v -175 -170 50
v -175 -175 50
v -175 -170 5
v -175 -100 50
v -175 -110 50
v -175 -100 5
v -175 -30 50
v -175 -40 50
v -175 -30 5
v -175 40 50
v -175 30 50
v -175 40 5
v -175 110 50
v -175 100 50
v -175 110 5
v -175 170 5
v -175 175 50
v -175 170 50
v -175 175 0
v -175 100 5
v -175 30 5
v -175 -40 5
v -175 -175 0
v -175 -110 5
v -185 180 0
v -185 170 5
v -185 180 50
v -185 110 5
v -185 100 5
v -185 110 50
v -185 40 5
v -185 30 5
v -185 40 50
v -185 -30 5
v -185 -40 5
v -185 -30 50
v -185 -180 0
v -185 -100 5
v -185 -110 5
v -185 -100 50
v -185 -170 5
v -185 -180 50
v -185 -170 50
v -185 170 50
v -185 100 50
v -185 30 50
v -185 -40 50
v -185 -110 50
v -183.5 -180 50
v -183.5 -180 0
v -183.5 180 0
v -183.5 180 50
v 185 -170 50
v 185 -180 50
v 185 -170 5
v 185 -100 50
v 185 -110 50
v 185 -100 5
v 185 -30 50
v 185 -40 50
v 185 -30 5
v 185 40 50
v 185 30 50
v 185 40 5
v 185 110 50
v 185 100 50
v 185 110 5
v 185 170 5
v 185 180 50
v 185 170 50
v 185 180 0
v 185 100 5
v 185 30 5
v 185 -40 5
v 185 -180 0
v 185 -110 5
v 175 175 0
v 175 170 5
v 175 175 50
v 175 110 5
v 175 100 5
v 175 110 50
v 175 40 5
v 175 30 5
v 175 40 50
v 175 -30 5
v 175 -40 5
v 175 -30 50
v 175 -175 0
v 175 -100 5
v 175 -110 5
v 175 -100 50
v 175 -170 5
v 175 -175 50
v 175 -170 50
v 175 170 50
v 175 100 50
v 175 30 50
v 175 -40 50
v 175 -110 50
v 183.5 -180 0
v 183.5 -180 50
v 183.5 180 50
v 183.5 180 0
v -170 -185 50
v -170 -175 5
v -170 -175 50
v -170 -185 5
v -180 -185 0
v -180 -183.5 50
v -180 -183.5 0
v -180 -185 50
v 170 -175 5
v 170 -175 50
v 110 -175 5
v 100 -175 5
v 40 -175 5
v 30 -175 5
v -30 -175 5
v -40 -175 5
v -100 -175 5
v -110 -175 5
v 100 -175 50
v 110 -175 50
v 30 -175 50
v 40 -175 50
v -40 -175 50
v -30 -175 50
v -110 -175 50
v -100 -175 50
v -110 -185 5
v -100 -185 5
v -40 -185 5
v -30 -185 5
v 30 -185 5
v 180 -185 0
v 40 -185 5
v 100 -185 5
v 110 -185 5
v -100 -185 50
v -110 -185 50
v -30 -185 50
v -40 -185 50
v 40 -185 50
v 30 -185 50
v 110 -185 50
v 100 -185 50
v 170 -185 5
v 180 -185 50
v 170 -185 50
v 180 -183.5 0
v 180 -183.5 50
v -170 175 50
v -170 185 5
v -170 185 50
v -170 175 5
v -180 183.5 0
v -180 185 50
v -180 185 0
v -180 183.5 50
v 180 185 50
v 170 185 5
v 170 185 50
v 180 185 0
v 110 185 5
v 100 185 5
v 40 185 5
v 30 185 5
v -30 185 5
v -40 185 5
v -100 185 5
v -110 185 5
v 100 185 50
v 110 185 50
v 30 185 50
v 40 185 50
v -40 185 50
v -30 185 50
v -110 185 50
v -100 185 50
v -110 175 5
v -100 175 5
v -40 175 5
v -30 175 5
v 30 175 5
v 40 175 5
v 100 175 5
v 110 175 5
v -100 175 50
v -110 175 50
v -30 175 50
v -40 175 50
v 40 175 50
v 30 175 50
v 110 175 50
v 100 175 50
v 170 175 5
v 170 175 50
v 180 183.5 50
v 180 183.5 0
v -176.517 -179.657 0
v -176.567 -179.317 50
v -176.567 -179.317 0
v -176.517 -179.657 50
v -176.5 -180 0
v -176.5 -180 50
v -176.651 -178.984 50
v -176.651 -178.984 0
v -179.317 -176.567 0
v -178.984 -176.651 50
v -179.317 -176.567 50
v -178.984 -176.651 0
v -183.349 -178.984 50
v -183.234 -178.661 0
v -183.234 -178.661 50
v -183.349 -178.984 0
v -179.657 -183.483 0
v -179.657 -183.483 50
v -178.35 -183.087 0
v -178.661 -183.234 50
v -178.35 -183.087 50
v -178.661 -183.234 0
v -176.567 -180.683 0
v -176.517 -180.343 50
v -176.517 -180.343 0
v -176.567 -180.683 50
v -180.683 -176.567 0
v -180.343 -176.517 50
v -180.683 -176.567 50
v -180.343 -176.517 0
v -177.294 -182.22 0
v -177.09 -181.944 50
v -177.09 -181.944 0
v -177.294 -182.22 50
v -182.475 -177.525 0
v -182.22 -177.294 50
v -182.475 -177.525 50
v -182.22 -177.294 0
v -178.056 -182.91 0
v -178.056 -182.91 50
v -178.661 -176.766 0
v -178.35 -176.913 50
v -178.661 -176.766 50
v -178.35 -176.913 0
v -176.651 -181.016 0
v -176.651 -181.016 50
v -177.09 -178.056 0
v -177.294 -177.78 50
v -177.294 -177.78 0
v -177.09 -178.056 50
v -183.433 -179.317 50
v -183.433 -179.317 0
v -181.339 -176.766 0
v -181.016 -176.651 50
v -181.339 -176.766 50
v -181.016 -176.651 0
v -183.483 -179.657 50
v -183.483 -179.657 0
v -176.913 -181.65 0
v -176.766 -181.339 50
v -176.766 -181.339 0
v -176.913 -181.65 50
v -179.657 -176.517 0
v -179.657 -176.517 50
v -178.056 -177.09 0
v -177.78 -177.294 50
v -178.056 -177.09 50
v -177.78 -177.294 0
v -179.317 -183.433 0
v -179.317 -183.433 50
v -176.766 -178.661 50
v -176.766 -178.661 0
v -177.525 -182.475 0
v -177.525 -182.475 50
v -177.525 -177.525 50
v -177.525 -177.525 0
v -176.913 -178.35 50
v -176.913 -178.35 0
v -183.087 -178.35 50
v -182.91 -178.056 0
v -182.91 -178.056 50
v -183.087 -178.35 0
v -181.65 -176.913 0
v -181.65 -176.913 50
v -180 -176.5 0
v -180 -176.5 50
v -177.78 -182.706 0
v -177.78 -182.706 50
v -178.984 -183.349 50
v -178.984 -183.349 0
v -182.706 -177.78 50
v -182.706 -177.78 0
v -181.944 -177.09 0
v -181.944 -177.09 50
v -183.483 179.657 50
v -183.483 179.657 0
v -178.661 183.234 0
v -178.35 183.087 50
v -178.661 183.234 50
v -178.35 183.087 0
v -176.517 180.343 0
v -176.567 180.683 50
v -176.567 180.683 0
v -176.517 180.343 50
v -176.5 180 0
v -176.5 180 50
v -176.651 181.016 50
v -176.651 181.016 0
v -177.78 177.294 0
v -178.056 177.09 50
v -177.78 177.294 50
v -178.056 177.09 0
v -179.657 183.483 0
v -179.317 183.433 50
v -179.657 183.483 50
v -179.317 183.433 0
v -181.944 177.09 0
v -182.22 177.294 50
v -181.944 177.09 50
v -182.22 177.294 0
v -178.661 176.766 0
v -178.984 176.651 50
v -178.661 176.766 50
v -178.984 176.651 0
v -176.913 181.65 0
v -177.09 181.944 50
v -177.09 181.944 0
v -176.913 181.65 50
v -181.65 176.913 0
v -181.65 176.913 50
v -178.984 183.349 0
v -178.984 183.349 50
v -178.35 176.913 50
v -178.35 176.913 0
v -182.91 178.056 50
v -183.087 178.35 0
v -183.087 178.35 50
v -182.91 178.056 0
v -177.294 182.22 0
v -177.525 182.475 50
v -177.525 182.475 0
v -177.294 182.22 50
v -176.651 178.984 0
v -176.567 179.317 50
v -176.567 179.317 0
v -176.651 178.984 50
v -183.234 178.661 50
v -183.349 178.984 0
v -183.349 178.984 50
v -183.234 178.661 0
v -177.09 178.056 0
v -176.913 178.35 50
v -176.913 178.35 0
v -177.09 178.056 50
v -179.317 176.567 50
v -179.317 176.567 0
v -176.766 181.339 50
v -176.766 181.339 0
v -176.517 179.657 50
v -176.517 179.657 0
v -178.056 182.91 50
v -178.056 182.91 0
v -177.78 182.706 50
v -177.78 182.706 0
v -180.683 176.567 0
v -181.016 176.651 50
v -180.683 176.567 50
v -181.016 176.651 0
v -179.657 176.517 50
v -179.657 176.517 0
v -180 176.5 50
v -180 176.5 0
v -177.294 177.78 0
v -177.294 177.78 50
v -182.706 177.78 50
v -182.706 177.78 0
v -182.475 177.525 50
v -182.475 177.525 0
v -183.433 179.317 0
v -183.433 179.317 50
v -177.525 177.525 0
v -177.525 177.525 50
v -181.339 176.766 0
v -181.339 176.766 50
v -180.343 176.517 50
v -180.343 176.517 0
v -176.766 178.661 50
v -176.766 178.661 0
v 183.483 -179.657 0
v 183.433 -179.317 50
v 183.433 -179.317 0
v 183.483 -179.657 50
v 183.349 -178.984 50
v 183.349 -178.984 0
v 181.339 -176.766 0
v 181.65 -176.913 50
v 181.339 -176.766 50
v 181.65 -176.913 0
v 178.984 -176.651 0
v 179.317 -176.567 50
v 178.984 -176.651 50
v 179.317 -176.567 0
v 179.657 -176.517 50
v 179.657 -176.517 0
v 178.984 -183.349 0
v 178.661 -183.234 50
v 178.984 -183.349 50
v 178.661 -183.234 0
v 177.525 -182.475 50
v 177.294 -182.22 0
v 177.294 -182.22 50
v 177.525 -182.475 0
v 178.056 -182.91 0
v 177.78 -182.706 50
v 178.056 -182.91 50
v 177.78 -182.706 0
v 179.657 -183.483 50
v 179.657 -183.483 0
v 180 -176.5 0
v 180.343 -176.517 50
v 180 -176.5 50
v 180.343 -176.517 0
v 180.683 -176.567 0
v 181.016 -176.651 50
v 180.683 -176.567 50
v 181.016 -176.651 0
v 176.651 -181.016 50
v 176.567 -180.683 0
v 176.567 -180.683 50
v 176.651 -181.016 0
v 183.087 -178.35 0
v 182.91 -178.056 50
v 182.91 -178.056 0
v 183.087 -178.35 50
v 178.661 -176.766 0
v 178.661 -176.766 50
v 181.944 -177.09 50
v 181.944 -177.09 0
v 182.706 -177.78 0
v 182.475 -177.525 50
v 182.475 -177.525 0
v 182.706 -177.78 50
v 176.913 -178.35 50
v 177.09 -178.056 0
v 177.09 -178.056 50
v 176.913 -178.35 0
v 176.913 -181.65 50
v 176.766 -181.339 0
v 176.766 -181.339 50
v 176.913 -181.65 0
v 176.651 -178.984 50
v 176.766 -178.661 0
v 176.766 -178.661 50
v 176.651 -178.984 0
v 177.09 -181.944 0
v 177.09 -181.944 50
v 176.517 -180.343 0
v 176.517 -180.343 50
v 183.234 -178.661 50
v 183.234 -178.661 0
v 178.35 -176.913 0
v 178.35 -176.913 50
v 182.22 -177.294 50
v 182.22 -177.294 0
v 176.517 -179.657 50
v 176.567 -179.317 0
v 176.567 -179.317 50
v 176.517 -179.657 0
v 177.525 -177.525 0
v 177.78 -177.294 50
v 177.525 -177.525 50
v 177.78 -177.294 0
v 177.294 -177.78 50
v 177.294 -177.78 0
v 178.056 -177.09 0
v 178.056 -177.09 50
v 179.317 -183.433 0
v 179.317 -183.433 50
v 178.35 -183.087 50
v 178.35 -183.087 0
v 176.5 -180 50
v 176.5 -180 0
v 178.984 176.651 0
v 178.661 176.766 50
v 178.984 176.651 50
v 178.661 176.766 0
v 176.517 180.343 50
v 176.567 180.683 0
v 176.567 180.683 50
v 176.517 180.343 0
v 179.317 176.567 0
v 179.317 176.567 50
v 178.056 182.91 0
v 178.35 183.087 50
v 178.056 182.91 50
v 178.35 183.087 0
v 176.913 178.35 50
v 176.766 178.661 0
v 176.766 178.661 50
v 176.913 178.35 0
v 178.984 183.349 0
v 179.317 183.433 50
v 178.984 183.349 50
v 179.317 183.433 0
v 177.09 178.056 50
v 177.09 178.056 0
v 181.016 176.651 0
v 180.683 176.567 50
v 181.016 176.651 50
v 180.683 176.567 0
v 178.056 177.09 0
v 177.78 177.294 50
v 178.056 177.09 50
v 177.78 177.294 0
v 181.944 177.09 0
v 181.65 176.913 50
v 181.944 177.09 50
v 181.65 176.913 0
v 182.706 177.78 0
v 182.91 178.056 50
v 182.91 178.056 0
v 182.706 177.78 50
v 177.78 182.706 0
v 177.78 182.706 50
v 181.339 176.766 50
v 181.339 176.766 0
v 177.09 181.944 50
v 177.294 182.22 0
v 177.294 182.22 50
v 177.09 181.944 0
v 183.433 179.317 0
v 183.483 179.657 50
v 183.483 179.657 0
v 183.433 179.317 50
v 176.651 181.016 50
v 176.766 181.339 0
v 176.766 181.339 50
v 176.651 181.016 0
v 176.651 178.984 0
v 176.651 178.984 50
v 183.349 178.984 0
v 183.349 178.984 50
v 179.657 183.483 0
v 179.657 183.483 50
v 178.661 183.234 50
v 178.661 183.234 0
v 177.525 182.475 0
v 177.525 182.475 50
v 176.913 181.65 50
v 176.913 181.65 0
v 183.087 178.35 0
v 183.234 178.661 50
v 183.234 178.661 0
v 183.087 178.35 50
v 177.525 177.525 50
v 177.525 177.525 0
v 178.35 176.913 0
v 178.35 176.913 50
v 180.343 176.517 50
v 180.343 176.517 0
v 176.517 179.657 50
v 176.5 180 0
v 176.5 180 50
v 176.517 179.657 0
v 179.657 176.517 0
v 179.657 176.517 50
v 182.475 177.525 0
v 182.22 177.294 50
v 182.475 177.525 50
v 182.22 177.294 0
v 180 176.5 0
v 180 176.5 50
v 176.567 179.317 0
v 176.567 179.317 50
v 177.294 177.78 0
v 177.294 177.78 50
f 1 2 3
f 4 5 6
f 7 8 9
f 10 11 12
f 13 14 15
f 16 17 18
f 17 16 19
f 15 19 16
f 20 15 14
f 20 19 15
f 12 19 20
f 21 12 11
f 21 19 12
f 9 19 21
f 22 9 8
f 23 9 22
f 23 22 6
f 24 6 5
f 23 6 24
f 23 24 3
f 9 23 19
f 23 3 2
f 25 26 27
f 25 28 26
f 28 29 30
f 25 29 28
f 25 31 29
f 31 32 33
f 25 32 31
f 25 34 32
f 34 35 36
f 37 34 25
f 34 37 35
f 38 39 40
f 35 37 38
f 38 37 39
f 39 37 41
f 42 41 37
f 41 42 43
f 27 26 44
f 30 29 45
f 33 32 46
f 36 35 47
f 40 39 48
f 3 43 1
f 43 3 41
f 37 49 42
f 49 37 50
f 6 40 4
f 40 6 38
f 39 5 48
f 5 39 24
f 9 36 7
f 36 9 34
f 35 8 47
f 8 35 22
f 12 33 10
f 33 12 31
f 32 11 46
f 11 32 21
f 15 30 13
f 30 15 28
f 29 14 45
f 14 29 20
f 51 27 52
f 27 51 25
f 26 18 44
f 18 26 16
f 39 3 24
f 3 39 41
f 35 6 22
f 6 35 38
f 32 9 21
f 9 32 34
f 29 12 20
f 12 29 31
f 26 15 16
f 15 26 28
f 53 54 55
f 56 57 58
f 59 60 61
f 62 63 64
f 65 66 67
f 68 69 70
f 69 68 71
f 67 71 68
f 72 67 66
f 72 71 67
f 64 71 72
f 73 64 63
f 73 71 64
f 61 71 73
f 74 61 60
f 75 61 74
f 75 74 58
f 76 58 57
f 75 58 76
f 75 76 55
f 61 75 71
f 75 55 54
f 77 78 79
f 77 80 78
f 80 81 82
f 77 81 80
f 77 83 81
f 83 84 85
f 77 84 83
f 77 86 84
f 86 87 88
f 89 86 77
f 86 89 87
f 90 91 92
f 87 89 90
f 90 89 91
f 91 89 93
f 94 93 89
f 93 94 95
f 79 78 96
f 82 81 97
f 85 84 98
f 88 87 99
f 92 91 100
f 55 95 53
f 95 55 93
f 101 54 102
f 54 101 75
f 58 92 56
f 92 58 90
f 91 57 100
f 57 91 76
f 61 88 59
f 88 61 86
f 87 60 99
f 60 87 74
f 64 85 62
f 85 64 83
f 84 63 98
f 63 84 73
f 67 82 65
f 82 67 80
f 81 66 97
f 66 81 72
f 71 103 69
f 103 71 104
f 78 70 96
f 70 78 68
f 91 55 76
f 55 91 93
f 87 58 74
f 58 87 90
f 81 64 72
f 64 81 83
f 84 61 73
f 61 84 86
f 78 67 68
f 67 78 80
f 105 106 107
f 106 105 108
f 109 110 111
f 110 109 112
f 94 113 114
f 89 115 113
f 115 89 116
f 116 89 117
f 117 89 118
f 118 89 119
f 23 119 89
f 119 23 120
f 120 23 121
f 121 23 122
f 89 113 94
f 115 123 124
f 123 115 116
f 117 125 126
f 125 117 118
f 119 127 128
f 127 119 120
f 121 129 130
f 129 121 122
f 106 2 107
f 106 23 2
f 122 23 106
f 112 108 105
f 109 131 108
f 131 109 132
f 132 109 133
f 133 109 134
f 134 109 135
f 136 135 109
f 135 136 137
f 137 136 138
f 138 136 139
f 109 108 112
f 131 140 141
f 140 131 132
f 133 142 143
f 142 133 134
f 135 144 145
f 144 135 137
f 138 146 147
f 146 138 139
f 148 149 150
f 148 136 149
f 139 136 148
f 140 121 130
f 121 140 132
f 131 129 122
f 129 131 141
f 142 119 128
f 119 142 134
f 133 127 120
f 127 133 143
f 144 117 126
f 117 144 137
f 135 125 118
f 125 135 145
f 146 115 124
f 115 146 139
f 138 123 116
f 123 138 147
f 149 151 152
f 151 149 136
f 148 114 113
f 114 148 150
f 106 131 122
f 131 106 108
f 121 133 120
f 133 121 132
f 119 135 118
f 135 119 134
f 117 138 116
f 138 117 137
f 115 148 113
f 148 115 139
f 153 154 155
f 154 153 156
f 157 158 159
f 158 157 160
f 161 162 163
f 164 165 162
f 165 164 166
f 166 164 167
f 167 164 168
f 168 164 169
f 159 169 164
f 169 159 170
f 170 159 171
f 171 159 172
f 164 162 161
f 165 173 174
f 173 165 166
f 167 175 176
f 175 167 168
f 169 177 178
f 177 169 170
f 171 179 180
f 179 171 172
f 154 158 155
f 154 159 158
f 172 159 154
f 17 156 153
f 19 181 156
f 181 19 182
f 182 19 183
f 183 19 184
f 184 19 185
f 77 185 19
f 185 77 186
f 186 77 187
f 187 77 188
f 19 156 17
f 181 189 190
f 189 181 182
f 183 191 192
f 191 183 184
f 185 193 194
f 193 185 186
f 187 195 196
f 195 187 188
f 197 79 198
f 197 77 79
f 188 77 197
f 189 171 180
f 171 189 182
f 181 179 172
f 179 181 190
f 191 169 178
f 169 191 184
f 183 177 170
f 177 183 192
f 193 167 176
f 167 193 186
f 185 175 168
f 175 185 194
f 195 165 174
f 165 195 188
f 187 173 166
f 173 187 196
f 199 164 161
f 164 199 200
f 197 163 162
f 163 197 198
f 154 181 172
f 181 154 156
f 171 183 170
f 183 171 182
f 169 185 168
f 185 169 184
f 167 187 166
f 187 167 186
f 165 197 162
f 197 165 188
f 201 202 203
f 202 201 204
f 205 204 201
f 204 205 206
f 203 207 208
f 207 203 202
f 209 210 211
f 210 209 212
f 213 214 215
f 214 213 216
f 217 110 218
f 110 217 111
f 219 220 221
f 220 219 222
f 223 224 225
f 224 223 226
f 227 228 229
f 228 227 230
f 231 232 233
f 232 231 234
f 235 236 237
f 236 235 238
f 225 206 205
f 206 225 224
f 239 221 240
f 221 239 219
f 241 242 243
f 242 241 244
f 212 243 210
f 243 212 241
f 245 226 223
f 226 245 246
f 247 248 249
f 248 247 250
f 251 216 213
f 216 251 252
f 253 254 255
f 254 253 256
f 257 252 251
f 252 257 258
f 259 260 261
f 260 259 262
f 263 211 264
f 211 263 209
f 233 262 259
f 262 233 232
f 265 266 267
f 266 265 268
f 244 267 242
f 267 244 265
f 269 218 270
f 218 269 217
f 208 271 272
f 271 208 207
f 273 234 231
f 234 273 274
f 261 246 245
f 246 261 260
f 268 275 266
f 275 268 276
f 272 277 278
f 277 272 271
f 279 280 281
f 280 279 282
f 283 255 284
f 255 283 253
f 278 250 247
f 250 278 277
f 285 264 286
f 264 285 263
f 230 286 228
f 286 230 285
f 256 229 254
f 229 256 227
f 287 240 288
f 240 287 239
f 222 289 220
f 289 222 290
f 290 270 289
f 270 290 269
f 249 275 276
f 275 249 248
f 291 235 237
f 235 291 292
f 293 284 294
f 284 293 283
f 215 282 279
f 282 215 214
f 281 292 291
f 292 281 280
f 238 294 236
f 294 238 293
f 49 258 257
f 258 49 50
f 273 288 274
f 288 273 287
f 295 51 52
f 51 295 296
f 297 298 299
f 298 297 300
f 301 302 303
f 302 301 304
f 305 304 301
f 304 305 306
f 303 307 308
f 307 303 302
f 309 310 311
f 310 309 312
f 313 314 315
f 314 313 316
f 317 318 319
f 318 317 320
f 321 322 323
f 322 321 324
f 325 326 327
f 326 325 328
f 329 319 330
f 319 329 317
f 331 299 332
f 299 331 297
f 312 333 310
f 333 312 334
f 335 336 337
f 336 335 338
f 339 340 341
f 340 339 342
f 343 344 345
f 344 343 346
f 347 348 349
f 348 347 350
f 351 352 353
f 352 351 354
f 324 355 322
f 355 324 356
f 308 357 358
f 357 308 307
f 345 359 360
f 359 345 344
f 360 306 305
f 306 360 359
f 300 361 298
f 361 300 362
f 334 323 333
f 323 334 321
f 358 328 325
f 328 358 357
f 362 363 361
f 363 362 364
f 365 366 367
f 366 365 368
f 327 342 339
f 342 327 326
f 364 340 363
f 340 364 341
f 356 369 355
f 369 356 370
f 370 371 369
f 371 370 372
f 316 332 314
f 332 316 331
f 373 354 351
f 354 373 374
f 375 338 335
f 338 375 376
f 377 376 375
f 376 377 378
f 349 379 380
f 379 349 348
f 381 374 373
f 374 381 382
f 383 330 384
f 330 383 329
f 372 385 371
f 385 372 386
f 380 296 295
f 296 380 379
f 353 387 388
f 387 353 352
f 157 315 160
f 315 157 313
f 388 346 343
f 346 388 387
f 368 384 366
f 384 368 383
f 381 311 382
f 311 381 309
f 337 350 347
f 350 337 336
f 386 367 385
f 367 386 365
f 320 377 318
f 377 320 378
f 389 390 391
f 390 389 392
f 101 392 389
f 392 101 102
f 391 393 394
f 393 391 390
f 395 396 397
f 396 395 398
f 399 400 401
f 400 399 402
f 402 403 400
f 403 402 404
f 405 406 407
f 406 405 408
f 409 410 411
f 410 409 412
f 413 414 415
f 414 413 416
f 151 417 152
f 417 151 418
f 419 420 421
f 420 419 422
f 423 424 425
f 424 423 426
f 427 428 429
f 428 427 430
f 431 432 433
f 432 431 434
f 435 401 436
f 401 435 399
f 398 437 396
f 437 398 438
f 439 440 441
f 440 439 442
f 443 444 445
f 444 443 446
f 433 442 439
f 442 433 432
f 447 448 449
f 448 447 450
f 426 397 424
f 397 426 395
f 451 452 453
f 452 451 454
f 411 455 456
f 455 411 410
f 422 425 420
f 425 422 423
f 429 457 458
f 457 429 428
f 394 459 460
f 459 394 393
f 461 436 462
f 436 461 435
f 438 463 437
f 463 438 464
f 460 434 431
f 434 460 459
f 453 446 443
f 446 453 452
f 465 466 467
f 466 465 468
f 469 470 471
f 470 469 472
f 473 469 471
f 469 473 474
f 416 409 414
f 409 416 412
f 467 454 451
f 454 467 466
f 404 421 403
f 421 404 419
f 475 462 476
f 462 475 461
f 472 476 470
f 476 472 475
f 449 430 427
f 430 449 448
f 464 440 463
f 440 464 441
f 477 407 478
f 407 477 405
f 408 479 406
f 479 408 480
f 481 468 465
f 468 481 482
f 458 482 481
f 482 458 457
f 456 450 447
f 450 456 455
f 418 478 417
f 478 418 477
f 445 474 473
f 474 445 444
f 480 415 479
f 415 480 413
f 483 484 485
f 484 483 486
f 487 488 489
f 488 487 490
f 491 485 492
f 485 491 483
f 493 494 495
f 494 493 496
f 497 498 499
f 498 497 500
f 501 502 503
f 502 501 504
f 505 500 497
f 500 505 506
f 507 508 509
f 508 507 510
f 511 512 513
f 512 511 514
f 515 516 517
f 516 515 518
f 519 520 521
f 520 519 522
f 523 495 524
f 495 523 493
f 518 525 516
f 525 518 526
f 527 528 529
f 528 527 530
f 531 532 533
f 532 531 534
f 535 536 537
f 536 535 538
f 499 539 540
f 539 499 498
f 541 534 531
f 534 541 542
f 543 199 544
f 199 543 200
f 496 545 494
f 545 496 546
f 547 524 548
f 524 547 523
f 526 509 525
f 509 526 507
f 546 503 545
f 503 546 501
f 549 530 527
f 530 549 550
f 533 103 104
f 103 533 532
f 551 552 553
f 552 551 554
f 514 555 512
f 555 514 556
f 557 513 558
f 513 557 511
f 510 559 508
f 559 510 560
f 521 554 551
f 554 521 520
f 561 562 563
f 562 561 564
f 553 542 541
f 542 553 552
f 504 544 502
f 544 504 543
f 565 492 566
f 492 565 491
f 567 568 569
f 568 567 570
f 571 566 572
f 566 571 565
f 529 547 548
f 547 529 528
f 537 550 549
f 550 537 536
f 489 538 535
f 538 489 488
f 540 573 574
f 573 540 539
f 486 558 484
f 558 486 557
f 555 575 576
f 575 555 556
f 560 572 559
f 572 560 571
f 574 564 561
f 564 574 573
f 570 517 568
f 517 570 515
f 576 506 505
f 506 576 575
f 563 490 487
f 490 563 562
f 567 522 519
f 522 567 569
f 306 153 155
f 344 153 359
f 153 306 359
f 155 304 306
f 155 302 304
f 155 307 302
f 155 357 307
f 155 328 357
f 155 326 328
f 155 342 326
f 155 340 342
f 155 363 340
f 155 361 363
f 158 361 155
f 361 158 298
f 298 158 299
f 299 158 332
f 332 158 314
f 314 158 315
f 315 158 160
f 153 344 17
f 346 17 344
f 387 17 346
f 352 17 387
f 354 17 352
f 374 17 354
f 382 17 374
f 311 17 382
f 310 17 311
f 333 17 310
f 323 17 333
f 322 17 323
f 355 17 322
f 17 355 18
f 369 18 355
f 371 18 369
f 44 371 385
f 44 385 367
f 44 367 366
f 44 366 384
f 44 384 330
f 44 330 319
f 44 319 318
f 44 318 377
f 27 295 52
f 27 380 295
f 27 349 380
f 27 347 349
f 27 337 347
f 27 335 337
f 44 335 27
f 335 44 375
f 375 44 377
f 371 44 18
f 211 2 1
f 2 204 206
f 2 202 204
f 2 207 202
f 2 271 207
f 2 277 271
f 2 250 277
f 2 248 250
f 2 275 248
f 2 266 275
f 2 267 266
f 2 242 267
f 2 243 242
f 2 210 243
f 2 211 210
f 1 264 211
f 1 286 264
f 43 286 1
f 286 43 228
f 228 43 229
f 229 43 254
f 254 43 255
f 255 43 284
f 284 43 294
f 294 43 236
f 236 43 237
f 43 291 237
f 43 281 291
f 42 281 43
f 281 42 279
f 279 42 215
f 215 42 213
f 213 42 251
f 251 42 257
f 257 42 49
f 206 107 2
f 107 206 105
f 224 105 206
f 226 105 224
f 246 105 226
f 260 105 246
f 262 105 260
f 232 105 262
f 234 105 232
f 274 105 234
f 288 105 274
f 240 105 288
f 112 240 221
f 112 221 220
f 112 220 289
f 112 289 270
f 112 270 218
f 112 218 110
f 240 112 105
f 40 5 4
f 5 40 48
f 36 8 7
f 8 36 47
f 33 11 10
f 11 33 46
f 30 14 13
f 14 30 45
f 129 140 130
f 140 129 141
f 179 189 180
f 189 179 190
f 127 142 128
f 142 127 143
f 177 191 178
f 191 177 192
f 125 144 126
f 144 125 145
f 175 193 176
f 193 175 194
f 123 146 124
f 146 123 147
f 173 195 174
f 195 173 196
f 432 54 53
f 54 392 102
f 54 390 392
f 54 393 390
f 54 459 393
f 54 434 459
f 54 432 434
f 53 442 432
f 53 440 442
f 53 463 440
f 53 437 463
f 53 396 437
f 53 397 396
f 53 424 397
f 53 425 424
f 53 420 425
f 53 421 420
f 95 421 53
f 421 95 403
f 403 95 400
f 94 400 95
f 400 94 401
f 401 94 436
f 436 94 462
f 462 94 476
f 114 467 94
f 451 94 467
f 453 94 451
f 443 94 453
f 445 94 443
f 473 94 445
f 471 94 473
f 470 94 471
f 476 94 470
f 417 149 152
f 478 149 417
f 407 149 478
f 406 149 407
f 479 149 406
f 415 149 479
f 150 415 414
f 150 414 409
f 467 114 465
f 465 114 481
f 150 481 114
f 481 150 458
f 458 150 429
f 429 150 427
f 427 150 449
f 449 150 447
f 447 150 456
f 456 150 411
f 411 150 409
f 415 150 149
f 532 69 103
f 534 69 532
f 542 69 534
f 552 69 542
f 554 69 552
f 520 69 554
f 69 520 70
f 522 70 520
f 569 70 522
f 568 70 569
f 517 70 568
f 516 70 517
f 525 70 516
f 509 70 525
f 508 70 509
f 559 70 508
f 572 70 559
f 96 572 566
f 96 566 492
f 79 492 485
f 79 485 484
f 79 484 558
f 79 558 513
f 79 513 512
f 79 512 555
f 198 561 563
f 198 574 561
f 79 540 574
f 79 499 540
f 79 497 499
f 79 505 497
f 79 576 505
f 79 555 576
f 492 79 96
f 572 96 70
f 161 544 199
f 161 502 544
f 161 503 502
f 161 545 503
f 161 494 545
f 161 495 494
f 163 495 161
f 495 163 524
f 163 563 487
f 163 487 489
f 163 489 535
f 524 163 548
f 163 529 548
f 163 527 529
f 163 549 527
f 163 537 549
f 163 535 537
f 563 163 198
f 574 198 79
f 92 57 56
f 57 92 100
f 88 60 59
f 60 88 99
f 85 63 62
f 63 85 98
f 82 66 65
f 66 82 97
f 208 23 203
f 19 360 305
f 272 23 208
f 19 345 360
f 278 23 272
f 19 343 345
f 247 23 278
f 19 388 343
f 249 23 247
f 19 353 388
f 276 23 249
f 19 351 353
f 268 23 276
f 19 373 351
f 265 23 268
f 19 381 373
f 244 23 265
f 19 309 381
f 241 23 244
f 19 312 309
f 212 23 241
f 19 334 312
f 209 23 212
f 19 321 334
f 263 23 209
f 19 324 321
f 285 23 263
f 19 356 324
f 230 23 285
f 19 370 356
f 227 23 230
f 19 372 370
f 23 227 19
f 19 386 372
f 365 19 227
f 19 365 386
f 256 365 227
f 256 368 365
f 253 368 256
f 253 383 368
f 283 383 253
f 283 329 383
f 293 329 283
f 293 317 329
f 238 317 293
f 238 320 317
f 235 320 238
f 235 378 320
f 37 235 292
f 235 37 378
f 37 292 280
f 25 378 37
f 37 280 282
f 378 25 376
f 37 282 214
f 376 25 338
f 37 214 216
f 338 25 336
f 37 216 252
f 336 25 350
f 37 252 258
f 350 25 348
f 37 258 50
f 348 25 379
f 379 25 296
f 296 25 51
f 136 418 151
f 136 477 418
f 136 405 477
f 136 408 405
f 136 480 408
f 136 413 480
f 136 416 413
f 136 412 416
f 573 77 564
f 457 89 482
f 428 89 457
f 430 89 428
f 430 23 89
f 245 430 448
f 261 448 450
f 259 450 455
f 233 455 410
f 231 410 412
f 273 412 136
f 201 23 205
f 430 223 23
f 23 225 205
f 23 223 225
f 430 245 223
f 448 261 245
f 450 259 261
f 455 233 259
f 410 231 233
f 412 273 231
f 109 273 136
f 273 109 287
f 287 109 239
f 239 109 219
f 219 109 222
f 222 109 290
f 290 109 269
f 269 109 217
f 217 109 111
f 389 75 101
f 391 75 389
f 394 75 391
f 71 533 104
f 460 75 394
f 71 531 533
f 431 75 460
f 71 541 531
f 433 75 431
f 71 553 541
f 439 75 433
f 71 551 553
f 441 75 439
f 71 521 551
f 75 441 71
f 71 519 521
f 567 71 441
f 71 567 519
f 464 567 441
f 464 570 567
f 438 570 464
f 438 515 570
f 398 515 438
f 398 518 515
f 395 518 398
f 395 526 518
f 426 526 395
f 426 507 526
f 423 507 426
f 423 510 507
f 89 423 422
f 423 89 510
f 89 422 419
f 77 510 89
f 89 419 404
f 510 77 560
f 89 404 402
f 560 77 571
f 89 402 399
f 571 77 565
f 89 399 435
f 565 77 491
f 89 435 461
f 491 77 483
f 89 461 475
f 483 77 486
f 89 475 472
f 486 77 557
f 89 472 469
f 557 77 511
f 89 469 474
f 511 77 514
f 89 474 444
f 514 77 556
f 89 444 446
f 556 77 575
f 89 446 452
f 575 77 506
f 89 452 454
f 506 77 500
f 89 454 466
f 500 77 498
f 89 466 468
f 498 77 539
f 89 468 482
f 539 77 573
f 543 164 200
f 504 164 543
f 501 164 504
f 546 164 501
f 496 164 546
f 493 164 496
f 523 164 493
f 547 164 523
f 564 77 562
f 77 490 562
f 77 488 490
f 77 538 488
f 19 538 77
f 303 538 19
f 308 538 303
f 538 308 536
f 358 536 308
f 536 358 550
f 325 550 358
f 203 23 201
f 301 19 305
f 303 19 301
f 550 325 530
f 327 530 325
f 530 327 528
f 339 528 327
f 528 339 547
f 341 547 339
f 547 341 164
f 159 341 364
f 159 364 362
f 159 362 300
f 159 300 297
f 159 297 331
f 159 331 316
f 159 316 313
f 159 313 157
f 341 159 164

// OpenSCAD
/*
  Cage slice 11 of 15
*/

bar = 10;
half_inner = 175;
gap = 70;
rod_d = 7;
half_outer = half_inner + bar;

function grid_pos(n) = -half_inner + n * gap;

module cage_full() {
  difference() {
    union() {
      // Floor grid at z = -10 .. 0
      for (j = [0:5]) {
        y = grid_pos(j);
        translate([-half_inner, y - bar/2, -bar])
          cube([2*half_inner, bar, bar], center=false);
      }
      for (i = [0:5]) {
        x = grid_pos(i);
        translate([x - bar/2, -half_inner, -bar])
          cube([bar, 2*half_inner, bar], center=false);
      }

      // Roof grid at z = 700 .. 710
      for (j = [0:5]) {
        y = grid_pos(j);
        translate([-half_inner, y - bar/2, 700])
          cube([2*half_inner, bar, bar], center=false);
      }
      for (i = [0:5]) {
        x = grid_pos(i);
        translate([x - bar/2, -half_inner, 700])
          cube([bar, 2*half_inner, bar], center=false);
      }

      // Side walls at x = ±175
      for (side = [-1, 1]) {
        sx = side * half_inner;
        x0 = (side == 1) ? sx : sx - bar;
        for (j = [0:5]) {
          y = grid_pos(j);
          translate([x0, y - bar/2, 0])
            cube([bar, bar, 700], center=false);
        }
        for (k = [0:10]) {
          zc = 0 + k * gap;
          translate([x0, -half_inner, zc - bar/2])
            cube([bar, 2*half_inner, bar], center=false);
        }
      }

      // Front/back walls at y = ±175
      for (side = [-1, 1]) {
        sy = side * half_inner;
        y0 = (side == 1) ? sy : sy - bar;
        for (i = [0:5]) {
          x = grid_pos(i);
          translate([x - bar/2, y0, 0])
            cube([bar, bar, 700], center=false);
        }
        for (k = [0:10]) {
          zc = 0 + k * gap;
          translate([-half_inner, y0, zc - bar/2])
            cube([2*half_inner, bar, bar], center=false);
        }
      }
    }

    for (sx = [-1, 1], sy = [-1, 1]) {
      translate([sx * (half_inner + bar/2),
                 sy * (half_inner + bar/2),
                 -20])
        cylinder(d = rod_d, h = 740, $fn = 64);
    }
  }
}

z_min = 490;
z_max = 540;  // height 50 mm

module slice() {
  intersection() {
    cage_full();
    translate([-half_outer - 5, -half_outer - 5, z_min])
      cube([2*(half_outer + 5), 2*(half_outer + 5), z_max - z_min], center=false);
  }
}

translate([0, 0, -z_min])
  slice();
